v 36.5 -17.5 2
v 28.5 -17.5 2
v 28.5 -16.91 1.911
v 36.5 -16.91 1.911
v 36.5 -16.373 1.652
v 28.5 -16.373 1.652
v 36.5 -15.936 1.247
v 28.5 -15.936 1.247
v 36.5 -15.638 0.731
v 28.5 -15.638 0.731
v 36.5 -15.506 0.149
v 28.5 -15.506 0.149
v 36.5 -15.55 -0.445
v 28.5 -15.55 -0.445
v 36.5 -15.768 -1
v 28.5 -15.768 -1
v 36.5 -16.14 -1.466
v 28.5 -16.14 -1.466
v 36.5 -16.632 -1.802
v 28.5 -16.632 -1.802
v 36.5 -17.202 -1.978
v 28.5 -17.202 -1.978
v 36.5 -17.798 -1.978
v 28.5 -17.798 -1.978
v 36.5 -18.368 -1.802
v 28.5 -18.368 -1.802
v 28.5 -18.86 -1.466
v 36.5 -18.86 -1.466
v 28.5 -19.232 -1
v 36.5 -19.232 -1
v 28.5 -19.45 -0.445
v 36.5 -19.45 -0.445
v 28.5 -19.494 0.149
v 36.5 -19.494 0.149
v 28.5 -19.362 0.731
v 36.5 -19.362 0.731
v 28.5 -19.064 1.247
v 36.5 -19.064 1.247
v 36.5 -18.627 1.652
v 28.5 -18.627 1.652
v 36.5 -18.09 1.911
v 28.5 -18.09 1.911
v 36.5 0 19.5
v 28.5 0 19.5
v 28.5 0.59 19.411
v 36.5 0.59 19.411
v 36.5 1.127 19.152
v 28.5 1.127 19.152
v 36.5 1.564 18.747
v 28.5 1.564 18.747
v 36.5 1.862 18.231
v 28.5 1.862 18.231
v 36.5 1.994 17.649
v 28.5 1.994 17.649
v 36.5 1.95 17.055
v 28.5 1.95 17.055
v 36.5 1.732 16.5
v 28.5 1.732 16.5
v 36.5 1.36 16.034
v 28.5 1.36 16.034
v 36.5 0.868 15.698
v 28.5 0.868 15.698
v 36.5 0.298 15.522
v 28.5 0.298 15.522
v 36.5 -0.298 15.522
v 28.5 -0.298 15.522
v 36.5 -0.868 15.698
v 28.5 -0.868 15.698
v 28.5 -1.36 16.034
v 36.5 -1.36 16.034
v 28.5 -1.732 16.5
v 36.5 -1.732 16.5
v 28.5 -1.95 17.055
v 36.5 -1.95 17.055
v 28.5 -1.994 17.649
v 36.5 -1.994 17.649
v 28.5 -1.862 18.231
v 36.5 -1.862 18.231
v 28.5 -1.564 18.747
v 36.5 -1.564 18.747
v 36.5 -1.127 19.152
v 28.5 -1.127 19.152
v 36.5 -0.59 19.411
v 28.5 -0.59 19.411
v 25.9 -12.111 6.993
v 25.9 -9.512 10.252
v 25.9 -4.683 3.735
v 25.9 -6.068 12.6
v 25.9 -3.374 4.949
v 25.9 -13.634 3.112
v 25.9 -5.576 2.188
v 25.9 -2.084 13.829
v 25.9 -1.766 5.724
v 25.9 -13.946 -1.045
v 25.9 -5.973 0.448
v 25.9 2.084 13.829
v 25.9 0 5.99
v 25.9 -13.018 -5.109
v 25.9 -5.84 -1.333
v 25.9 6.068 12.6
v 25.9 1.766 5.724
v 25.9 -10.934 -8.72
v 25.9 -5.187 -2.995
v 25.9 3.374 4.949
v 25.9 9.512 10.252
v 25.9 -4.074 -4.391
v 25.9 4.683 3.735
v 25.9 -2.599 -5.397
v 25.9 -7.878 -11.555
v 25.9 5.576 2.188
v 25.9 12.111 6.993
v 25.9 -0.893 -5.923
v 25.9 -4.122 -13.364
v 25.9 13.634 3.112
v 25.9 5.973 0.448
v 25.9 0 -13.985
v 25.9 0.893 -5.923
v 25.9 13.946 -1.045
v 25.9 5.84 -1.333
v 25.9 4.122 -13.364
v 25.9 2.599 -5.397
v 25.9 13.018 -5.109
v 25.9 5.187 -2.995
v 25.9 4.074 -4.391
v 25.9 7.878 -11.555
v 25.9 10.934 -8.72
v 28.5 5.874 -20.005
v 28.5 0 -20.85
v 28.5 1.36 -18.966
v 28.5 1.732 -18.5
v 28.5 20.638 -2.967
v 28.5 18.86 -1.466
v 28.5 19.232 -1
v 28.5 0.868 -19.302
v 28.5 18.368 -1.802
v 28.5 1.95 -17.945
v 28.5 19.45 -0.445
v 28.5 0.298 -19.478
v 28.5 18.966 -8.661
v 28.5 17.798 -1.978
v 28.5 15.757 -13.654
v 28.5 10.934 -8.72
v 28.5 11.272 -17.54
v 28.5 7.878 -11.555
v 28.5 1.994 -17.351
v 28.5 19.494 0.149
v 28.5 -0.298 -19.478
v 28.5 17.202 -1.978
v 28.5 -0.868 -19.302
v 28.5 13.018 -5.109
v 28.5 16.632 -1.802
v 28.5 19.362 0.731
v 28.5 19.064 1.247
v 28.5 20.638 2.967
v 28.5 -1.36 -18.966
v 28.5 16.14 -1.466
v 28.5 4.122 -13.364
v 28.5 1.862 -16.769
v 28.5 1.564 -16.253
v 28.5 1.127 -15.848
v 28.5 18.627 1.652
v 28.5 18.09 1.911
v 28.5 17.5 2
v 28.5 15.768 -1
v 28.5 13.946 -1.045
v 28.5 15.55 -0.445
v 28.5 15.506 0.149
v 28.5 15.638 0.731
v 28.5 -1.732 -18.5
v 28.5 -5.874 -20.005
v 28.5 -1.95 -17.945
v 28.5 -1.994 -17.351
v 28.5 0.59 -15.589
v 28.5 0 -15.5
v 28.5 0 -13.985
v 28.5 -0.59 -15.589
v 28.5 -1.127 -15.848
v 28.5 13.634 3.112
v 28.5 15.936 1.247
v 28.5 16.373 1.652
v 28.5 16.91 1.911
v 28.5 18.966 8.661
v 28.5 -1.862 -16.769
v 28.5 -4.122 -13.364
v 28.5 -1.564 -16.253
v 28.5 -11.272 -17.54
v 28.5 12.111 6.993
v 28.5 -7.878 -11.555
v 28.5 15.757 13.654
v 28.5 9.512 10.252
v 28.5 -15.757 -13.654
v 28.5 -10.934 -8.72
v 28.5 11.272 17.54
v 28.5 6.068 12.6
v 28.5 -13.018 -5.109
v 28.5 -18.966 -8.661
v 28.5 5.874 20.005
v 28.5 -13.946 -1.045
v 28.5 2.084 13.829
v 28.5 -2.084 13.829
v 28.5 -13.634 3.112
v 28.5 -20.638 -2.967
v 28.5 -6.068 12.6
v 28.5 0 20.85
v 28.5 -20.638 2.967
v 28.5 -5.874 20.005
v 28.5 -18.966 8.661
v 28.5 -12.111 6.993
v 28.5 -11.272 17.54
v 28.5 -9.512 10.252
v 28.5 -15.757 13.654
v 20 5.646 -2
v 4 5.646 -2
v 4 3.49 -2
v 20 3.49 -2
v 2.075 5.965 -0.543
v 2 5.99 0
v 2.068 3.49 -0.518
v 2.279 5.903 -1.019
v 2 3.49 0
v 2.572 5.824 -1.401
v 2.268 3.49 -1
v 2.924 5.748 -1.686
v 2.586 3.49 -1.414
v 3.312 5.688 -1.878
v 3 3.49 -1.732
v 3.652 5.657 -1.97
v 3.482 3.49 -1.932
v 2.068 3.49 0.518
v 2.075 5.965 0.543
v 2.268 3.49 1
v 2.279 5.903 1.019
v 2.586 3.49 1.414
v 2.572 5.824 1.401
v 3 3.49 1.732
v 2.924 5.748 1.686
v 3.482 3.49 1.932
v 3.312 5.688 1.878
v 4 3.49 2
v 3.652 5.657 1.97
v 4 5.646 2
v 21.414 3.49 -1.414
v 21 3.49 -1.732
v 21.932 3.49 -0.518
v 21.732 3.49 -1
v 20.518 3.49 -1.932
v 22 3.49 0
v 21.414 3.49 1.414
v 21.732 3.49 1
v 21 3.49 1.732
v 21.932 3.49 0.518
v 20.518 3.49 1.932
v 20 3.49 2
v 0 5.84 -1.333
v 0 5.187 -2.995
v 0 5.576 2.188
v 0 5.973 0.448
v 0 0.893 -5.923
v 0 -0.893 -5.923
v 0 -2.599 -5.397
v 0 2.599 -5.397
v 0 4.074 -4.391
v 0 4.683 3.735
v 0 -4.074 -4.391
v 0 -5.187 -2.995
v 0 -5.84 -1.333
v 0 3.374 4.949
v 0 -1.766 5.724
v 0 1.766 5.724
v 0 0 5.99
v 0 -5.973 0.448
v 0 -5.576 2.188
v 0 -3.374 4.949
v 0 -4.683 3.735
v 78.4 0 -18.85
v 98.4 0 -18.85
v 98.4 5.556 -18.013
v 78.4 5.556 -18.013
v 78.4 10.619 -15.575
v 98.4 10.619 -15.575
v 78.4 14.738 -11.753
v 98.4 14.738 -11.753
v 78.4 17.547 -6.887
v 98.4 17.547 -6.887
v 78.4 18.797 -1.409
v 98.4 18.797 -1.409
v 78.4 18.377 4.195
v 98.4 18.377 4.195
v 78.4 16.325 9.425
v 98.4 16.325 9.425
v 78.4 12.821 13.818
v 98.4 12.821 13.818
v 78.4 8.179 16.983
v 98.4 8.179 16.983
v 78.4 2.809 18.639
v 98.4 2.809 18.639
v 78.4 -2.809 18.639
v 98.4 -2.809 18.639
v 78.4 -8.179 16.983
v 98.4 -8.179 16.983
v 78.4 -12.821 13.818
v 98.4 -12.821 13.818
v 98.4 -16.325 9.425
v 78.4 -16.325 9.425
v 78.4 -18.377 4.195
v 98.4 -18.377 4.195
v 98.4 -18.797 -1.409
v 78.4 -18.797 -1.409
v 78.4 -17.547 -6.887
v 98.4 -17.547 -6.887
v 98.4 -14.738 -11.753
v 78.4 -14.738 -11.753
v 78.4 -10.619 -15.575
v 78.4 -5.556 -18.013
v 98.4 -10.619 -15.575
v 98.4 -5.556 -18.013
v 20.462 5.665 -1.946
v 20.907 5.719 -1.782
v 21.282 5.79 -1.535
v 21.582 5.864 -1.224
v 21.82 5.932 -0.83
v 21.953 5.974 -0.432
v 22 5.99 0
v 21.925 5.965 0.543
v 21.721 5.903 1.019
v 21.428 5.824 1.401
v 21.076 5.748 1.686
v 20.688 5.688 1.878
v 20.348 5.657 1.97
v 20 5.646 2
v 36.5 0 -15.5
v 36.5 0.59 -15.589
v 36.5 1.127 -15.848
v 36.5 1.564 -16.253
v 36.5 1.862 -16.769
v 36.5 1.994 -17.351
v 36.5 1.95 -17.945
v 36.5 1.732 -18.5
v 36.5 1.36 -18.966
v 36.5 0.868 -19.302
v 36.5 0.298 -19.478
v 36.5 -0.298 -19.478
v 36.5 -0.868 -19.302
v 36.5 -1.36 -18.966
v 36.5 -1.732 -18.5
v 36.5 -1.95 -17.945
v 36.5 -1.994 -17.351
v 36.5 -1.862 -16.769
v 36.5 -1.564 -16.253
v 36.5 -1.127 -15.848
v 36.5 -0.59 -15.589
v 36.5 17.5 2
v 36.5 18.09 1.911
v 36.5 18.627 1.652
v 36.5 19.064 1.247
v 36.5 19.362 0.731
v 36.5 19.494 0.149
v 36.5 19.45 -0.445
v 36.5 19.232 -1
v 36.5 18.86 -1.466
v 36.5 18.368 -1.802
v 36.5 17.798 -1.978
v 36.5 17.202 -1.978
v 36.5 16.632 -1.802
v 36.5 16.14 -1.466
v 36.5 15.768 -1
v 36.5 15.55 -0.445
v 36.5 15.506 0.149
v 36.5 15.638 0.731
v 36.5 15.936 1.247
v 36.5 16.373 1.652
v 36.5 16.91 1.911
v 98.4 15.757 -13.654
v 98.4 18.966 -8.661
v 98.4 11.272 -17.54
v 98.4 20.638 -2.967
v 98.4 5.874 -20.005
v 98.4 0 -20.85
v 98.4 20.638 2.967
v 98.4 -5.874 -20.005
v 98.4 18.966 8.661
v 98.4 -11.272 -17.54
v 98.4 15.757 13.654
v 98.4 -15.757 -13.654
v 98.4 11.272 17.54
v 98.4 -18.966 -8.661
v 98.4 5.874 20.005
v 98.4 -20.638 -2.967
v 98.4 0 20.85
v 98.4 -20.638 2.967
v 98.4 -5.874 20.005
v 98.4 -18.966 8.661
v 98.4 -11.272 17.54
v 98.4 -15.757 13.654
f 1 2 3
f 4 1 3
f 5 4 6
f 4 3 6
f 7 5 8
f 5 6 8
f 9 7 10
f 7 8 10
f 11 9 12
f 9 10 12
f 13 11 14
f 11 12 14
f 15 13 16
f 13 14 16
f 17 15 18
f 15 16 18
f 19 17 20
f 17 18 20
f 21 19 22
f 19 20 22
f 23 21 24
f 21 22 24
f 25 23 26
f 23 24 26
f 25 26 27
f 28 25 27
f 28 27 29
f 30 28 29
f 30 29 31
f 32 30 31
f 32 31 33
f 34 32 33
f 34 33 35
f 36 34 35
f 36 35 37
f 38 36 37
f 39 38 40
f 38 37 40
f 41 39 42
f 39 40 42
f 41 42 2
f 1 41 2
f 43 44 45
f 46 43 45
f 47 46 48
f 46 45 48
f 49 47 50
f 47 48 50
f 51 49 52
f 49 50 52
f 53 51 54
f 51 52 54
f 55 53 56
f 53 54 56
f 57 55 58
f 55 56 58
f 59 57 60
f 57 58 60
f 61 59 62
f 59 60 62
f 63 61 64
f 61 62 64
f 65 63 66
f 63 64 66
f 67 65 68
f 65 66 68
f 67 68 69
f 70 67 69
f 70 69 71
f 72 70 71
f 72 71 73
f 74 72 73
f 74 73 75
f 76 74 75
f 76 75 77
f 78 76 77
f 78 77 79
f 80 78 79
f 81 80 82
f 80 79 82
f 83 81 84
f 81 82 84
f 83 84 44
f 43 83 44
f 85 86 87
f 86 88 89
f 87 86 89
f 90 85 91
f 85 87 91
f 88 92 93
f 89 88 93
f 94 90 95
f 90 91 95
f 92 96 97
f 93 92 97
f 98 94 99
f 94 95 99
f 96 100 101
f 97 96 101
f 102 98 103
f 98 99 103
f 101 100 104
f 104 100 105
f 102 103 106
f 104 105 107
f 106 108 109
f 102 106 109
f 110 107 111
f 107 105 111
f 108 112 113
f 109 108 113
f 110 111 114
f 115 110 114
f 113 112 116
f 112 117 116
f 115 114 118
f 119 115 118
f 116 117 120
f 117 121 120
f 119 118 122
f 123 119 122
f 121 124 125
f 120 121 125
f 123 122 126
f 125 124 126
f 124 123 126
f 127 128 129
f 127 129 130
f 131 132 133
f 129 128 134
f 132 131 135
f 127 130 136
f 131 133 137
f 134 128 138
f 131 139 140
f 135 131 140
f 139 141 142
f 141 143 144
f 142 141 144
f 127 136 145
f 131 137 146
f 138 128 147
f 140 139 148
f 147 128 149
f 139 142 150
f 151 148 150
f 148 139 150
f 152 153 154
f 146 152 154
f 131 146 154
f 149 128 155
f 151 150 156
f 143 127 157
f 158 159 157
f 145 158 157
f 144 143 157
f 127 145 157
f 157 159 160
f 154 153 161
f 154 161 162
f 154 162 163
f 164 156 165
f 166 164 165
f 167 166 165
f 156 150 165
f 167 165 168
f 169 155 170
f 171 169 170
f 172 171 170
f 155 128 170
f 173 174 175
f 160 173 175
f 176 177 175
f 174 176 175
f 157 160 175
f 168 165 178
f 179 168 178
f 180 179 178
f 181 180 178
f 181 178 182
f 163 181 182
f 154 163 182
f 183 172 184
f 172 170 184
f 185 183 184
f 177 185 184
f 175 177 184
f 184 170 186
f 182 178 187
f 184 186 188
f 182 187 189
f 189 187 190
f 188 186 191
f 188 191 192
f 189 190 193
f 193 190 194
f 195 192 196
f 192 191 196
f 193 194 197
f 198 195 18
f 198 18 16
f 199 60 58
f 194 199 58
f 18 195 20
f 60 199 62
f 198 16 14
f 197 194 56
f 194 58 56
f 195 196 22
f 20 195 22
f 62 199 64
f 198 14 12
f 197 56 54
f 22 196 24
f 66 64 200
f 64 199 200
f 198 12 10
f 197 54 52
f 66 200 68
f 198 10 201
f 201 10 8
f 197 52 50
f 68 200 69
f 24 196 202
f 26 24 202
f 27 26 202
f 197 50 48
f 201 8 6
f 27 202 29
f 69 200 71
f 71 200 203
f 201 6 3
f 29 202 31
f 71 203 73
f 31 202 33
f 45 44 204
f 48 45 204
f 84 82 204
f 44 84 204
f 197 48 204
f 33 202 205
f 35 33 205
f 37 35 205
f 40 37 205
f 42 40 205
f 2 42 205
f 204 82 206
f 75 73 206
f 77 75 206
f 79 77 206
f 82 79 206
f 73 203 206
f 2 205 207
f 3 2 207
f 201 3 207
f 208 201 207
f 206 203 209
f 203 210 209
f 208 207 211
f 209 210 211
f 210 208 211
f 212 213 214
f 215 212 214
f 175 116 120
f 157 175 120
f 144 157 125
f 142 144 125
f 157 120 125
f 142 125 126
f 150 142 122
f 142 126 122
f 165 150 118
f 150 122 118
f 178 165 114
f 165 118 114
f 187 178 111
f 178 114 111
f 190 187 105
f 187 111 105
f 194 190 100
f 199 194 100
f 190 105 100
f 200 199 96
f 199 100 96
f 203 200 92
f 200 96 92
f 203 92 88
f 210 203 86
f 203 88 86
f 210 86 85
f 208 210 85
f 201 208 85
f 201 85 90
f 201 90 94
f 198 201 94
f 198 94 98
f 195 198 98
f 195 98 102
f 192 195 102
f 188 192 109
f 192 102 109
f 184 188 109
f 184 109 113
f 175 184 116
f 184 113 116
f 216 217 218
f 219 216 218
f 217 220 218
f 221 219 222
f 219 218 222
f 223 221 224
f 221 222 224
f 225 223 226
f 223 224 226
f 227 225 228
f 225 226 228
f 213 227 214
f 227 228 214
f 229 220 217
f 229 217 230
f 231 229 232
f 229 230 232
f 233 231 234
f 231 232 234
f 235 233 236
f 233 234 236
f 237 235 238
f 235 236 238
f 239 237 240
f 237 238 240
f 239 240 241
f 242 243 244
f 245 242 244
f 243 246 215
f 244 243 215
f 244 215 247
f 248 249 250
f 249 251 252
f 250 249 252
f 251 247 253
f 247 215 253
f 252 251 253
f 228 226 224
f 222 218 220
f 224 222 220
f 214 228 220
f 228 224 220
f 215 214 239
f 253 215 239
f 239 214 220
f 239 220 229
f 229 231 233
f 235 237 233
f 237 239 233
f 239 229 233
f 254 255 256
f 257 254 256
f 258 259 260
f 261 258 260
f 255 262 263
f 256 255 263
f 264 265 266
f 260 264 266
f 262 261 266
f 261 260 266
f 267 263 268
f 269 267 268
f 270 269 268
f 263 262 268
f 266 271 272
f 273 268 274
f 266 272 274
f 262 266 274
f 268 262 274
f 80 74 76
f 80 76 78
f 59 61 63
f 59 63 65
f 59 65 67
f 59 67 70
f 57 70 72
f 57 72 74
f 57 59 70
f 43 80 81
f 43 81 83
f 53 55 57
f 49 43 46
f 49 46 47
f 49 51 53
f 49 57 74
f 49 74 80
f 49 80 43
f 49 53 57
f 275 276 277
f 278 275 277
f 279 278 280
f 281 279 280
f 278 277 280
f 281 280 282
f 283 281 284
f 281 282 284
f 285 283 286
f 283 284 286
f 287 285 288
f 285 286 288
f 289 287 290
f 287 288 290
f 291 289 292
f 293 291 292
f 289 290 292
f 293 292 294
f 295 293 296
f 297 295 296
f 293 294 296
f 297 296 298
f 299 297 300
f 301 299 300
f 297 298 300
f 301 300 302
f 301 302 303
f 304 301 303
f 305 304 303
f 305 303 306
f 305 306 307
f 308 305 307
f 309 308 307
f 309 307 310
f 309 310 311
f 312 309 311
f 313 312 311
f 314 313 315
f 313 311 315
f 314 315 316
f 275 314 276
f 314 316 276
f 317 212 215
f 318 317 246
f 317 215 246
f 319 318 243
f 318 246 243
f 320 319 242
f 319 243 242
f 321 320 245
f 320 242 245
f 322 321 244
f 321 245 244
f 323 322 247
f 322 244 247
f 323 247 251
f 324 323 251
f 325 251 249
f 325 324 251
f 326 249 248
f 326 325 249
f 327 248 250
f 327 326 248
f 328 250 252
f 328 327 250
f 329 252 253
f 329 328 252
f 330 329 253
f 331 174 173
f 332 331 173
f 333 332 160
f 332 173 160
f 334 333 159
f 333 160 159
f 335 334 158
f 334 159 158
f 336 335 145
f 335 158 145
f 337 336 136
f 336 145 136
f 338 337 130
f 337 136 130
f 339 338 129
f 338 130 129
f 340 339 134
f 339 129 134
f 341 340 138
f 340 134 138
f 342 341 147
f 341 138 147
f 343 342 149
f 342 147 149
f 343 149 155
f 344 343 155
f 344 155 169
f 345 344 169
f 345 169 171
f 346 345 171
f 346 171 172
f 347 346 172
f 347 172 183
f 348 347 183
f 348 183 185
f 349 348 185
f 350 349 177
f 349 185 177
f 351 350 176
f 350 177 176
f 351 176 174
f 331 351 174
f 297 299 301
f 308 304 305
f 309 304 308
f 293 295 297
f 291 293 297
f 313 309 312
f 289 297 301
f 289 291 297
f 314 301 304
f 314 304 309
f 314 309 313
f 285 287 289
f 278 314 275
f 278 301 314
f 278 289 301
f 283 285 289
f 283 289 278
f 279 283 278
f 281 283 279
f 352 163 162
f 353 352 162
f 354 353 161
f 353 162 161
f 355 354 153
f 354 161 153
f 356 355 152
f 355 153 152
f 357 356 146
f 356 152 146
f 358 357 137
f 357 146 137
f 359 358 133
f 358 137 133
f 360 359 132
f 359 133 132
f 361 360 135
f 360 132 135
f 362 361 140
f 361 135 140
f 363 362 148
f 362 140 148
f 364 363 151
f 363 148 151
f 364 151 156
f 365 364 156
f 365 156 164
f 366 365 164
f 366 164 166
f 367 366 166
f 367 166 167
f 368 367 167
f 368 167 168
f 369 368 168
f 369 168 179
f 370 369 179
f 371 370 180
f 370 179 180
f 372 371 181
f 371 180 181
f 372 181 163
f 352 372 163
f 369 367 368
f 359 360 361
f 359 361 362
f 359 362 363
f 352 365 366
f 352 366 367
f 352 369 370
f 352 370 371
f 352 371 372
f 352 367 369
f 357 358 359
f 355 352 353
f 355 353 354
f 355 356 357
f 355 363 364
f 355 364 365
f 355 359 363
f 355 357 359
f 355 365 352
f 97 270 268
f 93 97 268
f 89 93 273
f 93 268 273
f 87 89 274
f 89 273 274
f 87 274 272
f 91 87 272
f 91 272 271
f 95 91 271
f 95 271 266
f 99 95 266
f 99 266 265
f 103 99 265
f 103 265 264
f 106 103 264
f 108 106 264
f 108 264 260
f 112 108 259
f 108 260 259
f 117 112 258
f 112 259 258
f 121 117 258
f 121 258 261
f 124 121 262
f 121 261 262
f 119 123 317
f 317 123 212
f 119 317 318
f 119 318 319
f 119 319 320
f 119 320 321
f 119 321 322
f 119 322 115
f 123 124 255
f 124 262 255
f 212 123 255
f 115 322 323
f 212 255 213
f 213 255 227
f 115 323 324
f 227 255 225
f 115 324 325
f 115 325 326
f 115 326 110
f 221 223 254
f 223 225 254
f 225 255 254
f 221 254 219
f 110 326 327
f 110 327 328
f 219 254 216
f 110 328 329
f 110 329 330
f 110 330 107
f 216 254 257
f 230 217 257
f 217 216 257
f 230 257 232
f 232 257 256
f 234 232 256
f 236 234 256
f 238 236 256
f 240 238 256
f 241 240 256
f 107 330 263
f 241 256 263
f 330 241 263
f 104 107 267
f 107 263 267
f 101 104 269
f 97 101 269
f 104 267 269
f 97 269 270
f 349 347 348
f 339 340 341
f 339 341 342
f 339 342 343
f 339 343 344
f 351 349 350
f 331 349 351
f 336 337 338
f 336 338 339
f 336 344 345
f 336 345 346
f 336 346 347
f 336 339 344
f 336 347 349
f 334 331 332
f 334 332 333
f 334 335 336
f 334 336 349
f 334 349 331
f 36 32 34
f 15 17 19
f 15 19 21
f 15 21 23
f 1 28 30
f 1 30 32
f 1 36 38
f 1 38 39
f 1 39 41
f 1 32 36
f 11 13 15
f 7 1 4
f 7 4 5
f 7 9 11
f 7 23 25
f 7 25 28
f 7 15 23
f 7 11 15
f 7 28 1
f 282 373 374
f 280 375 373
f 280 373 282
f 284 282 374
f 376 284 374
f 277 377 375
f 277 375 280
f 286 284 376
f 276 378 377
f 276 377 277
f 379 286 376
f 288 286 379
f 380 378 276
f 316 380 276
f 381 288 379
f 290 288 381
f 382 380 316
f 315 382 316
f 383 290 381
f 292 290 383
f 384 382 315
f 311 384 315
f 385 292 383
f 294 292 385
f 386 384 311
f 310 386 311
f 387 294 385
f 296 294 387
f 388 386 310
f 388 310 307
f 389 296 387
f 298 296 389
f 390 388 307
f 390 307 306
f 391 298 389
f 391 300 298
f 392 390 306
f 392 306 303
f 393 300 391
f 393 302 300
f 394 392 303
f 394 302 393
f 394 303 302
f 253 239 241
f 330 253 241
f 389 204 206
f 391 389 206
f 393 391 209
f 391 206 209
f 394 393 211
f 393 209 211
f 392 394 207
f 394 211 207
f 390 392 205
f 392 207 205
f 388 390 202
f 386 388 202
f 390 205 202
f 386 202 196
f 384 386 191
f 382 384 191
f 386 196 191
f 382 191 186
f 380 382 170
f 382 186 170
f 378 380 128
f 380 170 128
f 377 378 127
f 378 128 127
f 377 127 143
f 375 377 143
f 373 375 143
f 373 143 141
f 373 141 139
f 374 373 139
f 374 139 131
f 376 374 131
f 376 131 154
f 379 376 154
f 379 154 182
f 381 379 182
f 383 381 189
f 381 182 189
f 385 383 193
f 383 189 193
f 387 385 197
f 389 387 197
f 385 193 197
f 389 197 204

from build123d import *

# Parameters (mm, degrees)
SKETCH1_R          = 5.99
EXTRUDE1_DEPTH     = 25.9
SKETCH2_R          = 13.985
EXTRUDE2_DEPTH     = 2.6
SKETCH3_R          = 20.85
EXTRUDE3_DEPTH     = 69.9
CUT_EXTRUDE1_START = -2
CUT_EXTRUDE1_DEPTH = 20
FILLET8_R          = 2
SKETCH7_R          = 2
CUT_EXTRUDE2_DEPTH = 8
SKETCH9_R          = 18.85
CUT_EXTRUDE3_DEPTH = 20


with BuildPart() as part:
    # Sketch1 → Extrude1 (new body)
    with BuildSketch(Plane(origin=(0, 0, 0), x_dir=(0, 0, -1), z_dir=(1, 0, 0))):
        with Locations(Location((0, 0, 0), (0, 0, 180))):
            Circle(SKETCH1_R)
    extrude(amount=EXTRUDE1_DEPTH)

    # Sketch2 → Extrude2 (add)
    with BuildSketch(Plane(origin=(25.9, 0, 0), x_dir=(0, 0, -1), z_dir=(1, 0, 0))):
        Circle(SKETCH2_R)
    extrude(amount=EXTRUDE2_DEPTH)

    # Sketch3 → Extrude3 (add)
    with BuildSketch(Plane(origin=(28.5, 0, 0), x_dir=(0, 0, -1), z_dir=(1, 0, 0))):
        with Locations(Location((0, 0, 0), (0, 0, 180))):
            Circle(SKETCH3_R)
    extrude(amount=EXTRUDE3_DEPTH)

    # Sketch6 → Cut-Extrude1 (cut)
    with BuildSketch(Plane.ZY.offset(CUT_EXTRUDE1_START)):
        with BuildLine():
            Line((0, 3.49), (0, 5.99))
            ThreePointArc((0, 5.99), (-1.014663299, 5.903436151), (-2, 5.646246541))
            Line((-2, 5.646246541), (-2, 3.49))
            Line((-2, 3.49), (0, 3.49))
        make_face()
        with BuildLine():
            ThreePointArc((2, 5.646246541), (1.014663299, 5.903436151), (0, 5.99))
            Line((0, 5.99), (0, 3.49))
            Line((0, 3.49), (2, 3.49))
            Line((2, 3.49), (2, 5.646246541))
        make_face()
    extrude(amount=-CUT_EXTRUDE1_DEPTH, mode=Mode.SUBTRACT)

    # Fillet8
    fillet8_edges = [part.edges().sort_by_distance(p)[0] for p in [
        (2, 4.56812327, -2),
        (22, 4.56812327, -2),
        (2, 4.56812327, 2),
        (22, 4.56812327, 2),
    ]]
    fillet(fillet8_edges, radius=FILLET8_R - 0.0001)  # a hair under: the kernel refuses the full size

    # Sketch7 → Cut-Extrude2 (cut)
    with BuildSketch(Plane.ZY.offset(-28.5)):
        with Locations((0, 17.5)):
            Circle(SKETCH7_R)
        with Locations((17.5, 0)):
            Circle(SKETCH7_R)
        with Locations((0, -17.5)):
            Circle(SKETCH7_R)
        with Locations((-17.5, 0)):
            Circle(SKETCH7_R)
    extrude(amount=-CUT_EXTRUDE2_DEPTH, mode=Mode.SUBTRACT)

    # Sketch9 → Cut-Extrude3 (cut)
    with BuildSketch(Plane(origin=(98.4, 0, 0), x_dir=(0, 0, -1), z_dir=(1, 0, 0))):
        Circle(SKETCH9_R)
    extrude(amount=-CUT_EXTRUDE3_DEPTH, mode=Mode.SUBTRACT)


solid = part.part
